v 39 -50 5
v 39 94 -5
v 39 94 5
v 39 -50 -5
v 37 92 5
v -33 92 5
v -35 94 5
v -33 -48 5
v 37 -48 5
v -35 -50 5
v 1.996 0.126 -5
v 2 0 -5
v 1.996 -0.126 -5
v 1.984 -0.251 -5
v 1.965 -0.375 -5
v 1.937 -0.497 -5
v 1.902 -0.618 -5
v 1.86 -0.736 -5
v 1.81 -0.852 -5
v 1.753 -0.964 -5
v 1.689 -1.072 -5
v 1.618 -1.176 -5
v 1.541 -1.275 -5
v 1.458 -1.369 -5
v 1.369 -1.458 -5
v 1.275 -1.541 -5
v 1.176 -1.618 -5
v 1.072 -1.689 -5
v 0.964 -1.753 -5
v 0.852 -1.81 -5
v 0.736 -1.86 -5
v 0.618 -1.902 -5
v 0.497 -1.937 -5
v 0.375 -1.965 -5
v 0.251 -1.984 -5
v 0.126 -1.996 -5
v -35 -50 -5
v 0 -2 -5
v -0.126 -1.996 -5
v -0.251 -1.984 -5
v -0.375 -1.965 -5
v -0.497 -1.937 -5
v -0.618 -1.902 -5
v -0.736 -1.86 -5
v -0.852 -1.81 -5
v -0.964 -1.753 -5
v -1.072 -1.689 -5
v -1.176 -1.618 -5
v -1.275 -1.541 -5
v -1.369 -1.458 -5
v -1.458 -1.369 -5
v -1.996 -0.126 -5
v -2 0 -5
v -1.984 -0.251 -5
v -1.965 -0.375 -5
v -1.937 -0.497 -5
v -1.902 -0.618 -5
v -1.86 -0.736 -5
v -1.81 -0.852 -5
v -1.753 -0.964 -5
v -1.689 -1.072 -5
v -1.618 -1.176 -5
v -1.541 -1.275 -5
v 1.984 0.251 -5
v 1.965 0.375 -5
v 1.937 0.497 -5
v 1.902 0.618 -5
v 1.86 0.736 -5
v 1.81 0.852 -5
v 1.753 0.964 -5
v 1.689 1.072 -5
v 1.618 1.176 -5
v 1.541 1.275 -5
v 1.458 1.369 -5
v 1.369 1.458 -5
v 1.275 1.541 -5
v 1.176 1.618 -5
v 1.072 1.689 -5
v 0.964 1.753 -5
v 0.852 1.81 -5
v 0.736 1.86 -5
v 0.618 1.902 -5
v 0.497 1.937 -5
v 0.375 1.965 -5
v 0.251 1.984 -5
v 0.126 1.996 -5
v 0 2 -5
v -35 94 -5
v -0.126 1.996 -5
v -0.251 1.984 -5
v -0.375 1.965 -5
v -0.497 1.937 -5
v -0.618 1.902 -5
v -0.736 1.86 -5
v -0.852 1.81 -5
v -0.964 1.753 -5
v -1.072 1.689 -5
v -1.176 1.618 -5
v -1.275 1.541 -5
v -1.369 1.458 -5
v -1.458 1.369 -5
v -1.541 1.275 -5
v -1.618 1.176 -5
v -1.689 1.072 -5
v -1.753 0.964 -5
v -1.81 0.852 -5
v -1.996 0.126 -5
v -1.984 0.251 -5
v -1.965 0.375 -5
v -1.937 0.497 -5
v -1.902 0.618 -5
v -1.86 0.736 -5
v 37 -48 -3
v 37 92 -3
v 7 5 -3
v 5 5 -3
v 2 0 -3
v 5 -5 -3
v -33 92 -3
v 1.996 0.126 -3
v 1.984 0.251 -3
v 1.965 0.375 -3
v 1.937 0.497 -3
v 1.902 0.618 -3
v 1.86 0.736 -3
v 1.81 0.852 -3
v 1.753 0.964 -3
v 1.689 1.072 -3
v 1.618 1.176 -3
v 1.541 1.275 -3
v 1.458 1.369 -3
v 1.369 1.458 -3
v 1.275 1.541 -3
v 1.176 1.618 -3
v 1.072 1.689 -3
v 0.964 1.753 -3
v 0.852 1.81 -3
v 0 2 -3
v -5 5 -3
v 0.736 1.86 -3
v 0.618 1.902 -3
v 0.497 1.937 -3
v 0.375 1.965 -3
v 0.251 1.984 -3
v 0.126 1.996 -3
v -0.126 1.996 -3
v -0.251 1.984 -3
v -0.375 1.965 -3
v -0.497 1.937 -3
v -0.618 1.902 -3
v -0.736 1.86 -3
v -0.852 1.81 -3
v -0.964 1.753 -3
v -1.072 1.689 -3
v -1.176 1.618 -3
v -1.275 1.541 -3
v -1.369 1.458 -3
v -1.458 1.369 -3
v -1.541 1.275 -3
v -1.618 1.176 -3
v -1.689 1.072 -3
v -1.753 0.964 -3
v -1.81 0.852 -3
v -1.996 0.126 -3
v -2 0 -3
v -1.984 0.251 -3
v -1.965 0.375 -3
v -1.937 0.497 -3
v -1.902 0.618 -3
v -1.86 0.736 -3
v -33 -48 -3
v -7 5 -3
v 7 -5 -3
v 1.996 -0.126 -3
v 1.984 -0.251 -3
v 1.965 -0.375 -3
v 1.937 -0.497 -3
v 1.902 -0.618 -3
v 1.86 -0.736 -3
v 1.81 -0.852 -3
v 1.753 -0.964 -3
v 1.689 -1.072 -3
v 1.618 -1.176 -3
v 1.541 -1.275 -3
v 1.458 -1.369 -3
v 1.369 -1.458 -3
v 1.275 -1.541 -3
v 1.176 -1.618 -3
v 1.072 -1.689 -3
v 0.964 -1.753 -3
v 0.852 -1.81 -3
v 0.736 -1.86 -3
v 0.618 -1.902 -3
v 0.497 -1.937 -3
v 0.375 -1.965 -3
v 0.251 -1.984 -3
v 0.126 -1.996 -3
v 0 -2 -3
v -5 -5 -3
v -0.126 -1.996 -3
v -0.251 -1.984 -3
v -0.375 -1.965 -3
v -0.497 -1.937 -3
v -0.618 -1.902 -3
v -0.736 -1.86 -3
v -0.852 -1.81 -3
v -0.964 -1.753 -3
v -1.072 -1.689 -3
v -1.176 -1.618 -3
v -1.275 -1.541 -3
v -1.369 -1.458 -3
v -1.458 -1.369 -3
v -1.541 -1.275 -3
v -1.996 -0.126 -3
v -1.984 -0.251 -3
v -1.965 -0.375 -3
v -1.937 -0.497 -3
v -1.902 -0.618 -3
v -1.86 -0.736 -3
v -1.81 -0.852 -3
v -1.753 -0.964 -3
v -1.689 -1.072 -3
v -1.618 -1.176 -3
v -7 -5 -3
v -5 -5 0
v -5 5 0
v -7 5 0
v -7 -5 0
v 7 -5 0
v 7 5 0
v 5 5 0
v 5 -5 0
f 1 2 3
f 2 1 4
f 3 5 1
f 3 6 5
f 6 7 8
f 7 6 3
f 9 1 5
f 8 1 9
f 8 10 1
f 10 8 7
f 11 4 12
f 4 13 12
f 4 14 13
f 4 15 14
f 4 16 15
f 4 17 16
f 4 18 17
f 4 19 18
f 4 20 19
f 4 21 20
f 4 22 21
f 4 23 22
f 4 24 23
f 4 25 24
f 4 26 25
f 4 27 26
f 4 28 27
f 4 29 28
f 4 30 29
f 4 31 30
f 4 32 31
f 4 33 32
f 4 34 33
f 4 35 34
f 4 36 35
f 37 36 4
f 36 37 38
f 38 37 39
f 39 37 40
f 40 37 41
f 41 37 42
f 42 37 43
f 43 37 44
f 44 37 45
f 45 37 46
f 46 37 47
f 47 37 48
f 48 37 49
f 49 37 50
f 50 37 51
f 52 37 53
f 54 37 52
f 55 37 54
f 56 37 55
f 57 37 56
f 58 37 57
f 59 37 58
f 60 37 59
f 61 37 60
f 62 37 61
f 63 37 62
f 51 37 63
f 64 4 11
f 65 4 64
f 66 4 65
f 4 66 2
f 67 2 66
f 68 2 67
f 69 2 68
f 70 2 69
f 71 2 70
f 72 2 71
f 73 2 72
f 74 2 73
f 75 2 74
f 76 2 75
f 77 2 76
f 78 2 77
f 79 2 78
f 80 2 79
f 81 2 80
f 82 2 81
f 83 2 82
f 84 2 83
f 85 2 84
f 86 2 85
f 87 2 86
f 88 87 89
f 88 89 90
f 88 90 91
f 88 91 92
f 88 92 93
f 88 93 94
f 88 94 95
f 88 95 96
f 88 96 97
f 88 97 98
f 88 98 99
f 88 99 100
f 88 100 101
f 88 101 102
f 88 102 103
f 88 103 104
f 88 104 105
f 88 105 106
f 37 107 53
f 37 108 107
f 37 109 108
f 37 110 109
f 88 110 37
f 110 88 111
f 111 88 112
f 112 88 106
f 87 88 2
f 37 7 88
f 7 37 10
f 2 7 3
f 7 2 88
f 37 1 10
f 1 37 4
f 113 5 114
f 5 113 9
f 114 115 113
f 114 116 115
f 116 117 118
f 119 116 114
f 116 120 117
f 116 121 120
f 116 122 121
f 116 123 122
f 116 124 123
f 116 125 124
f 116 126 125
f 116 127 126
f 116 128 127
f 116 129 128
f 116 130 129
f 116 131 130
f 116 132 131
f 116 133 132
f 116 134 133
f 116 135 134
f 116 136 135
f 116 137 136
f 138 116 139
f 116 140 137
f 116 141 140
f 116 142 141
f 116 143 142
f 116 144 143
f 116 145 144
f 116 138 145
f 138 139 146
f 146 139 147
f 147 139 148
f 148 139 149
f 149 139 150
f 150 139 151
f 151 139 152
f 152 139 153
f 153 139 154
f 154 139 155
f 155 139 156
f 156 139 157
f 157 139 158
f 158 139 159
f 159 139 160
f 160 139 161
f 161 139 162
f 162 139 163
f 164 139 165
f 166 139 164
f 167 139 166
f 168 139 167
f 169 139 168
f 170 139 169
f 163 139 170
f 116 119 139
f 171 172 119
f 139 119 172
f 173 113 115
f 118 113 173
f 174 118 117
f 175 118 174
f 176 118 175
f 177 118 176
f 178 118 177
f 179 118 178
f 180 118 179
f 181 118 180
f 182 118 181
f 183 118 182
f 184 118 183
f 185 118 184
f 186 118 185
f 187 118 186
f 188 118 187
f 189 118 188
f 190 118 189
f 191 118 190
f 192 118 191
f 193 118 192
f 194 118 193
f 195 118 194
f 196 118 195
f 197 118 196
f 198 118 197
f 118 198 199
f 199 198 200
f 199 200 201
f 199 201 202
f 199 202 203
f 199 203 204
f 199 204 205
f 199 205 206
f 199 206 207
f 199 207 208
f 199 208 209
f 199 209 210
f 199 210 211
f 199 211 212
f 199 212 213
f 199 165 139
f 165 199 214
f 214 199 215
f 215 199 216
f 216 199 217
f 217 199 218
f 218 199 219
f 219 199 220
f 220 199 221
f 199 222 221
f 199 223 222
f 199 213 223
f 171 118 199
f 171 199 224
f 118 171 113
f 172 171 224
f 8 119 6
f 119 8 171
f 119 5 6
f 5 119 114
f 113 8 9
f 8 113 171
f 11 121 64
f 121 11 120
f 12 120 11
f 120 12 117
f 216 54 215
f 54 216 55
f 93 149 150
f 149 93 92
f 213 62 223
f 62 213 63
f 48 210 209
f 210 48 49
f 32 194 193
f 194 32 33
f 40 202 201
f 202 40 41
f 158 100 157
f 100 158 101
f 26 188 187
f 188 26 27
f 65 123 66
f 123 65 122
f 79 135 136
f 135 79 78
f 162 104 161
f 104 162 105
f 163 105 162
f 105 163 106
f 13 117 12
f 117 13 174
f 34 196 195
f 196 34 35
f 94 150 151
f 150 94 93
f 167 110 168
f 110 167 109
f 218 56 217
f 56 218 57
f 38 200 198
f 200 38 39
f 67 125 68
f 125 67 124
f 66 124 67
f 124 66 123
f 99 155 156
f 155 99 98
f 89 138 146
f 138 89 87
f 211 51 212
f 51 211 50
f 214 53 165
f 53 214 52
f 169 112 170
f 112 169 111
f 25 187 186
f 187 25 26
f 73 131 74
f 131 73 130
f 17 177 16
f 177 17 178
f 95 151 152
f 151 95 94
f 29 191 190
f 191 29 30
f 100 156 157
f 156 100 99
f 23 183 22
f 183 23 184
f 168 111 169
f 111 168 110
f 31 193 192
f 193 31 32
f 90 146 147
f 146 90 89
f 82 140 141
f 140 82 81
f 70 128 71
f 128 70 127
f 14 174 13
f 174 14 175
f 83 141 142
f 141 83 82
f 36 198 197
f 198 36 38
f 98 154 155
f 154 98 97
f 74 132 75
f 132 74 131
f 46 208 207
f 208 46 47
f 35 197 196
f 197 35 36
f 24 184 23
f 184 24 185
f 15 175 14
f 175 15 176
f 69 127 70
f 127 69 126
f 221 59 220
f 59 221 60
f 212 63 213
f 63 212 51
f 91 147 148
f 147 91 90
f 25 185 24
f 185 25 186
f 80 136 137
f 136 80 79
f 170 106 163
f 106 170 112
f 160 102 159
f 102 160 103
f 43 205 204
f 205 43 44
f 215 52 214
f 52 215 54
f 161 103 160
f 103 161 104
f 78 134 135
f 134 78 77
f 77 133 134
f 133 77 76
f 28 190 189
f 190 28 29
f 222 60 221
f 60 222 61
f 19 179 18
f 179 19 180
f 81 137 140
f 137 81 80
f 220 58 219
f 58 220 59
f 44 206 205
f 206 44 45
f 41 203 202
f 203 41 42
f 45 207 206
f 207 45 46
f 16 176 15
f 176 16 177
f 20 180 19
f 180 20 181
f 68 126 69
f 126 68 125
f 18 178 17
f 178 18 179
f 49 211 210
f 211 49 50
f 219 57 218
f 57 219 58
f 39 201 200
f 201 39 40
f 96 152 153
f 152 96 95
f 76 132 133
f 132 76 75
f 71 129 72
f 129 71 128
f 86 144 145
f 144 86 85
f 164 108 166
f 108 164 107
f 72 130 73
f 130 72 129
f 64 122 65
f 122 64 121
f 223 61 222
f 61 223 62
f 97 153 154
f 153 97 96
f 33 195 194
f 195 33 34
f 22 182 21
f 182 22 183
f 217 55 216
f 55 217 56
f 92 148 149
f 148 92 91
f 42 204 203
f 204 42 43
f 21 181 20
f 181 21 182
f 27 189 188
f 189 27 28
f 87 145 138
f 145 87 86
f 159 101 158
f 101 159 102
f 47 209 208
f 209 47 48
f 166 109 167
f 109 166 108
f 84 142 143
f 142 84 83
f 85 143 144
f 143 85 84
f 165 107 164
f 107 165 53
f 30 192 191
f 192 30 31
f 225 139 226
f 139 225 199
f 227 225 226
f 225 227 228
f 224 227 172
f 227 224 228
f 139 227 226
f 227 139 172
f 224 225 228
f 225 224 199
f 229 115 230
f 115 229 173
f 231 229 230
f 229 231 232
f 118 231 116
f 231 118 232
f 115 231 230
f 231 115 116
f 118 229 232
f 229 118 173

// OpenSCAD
// Draw simple empty box with 2mm thickness
module drawbox(x,y,z) {
    difference() {
        cube([x+4, y+4, z]);
        translate([2,2,2]) {
            cube([x, y, z]);
        }
    }
}

// Draw two bars that holds potentiometer in place
module potholder() {
        translate([-7,-5,0]) {
            cube([2,10,5]);
        }
        translate([5,-5,0]) {
            cube([2,10,5]);
        }
}

// Draw box
module drawbox2(x,y,z,yoffset) {
    difference() {
        drawbox(x,y,z);
        translate([x/2,yoffset,1]) {
            cylinder(h=4,r=2,center=true, $fn=100);
        }
    }
    translate([x/2,yoffset,0]) {
        potholder();
    }
}

translate([-35,-50,-5]) {
    drawbox2(70,140,10,50);
}
